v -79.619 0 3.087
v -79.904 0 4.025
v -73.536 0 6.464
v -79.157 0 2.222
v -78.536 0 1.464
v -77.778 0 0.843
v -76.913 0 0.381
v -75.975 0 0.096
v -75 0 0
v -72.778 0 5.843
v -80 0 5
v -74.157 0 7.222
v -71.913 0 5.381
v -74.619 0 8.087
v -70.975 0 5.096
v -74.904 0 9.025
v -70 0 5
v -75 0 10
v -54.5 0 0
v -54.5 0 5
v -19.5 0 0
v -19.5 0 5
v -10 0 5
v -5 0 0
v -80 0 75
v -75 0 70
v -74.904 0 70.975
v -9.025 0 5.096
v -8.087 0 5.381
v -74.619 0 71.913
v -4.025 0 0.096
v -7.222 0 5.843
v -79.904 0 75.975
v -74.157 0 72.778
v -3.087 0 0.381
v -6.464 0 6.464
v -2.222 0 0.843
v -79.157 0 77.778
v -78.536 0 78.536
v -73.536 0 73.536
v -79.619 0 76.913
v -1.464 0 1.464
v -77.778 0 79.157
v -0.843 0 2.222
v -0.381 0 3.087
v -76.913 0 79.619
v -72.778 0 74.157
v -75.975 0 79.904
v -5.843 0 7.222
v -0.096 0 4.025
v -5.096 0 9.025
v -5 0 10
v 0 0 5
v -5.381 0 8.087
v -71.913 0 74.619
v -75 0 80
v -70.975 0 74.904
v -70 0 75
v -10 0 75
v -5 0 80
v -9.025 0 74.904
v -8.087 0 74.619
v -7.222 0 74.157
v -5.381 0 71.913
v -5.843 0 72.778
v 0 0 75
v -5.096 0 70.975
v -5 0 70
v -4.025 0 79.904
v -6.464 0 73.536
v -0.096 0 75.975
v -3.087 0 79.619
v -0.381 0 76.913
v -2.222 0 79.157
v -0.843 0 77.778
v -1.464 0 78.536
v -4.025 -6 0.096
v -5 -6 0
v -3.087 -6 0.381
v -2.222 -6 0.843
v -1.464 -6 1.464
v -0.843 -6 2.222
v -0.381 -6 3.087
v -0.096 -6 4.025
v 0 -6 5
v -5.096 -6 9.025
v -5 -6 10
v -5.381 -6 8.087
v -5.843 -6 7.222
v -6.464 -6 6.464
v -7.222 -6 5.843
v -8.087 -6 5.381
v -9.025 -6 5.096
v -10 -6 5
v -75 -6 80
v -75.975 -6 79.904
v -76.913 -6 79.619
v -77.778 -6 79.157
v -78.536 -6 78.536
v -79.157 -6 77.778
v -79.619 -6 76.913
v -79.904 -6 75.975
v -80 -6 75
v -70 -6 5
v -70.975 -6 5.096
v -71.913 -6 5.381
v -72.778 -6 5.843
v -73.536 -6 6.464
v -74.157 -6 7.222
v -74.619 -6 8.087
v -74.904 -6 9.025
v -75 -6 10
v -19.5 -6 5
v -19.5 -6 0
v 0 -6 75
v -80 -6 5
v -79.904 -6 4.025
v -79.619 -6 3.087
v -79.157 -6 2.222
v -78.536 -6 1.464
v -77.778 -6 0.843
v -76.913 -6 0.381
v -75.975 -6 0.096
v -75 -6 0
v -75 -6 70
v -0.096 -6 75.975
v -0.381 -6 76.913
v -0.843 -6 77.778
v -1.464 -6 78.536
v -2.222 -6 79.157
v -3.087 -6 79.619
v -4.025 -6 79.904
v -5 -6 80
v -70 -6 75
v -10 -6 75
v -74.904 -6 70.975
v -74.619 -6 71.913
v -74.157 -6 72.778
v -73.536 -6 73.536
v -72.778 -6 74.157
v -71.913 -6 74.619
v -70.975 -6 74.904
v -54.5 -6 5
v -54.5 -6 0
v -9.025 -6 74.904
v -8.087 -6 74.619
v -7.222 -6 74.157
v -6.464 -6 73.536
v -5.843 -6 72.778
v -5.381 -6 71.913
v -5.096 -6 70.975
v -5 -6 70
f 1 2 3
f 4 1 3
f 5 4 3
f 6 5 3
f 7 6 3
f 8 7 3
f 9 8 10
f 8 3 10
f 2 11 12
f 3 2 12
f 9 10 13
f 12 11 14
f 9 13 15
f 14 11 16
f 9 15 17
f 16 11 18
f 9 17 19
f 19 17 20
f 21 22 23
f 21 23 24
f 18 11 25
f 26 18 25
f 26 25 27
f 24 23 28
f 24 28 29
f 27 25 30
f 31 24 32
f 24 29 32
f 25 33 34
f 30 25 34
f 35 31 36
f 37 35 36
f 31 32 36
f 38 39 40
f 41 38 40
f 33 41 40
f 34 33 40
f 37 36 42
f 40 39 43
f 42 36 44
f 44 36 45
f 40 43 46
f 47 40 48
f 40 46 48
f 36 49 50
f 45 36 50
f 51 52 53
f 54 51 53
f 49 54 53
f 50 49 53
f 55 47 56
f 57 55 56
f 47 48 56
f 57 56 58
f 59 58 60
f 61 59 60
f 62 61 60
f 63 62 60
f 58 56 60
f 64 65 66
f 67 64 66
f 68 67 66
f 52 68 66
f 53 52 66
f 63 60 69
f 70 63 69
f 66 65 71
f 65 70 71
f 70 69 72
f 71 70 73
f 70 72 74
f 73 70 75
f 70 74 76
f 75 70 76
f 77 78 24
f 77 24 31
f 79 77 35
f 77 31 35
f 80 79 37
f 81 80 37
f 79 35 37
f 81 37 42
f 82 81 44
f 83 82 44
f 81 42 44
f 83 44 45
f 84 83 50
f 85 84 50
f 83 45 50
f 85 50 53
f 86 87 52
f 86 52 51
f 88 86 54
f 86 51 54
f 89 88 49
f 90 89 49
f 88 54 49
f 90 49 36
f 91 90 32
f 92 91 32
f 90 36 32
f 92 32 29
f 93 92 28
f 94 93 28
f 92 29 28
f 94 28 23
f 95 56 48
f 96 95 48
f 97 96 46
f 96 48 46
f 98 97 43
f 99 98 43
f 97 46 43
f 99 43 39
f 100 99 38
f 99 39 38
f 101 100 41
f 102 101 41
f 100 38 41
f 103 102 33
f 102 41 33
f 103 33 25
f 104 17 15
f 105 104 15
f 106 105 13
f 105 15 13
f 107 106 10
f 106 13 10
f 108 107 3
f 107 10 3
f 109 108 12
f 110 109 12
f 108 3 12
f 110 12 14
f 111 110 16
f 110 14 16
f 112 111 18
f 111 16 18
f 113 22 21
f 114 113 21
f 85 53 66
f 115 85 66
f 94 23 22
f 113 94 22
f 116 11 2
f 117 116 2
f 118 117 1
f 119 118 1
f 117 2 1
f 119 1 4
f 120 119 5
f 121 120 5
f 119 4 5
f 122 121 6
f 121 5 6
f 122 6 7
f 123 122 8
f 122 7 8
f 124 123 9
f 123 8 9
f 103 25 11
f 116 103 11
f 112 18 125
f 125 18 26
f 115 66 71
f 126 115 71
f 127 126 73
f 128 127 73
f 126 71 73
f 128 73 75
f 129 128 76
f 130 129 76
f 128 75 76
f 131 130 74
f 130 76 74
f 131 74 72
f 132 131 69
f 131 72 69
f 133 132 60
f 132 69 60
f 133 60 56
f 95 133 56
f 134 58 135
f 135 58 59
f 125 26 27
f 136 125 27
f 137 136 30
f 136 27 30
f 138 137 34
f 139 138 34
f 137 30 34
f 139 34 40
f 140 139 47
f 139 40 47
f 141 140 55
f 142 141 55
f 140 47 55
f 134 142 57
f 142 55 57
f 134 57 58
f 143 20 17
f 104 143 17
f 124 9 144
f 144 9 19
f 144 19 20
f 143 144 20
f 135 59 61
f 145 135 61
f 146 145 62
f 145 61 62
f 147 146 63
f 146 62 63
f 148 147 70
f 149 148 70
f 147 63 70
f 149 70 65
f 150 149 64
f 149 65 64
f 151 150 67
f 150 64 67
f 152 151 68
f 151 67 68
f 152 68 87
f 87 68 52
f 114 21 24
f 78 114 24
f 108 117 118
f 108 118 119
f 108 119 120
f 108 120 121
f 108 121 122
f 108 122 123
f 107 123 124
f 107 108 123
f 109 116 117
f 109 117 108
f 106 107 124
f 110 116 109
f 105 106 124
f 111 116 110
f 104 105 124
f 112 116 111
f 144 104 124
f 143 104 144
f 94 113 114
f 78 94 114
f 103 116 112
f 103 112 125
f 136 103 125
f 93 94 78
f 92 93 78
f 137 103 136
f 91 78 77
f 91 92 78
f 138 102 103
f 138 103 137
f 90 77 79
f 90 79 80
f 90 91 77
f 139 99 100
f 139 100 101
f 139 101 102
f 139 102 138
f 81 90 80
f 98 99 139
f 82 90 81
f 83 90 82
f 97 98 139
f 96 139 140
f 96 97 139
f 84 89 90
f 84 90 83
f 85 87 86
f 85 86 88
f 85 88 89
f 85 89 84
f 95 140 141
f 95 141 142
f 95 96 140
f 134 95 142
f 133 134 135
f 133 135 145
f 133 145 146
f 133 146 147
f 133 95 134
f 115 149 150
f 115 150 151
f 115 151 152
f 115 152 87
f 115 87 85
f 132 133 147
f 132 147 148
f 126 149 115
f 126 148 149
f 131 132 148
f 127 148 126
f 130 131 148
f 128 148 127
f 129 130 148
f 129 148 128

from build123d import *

# Parameters (mm, degrees)
F1_DEPTH = 6


with BuildPart() as f1:
    # F0 (on Front) → F1 (new body)
    with BuildSketch(Plane.XZ):
        with BuildLine():
            Line((-19.5, 0), (-5, 0))
            ThreePointArc((-5, 0), (-1.464466, 1.464466), (0, 5))
            Line((0, 5), (0, 75))
            ThreePointArc((0, 75), (-1.464466, 78.535534), (-5, 80))
            Line((-5, 80), (-75, 80))
            ThreePointArc((-75, 80), (-78.535534, 78.535534), (-80, 75))
            Line((-80, 75), (-80, 5))
            ThreePointArc((-80, 5), (-78.535534, 1.464466), (-75, 0))
            Line((-75, 0), (-54.5, 0))
            Line((-54.5, 0), (-54.5, 5))
            Line((-54.5, 5), (-70, 5))
            ThreePointArc((-70, 5), (-73.535534, 6.464466), (-75, 10))
            Line((-75, 10), (-75, 70))
            ThreePointArc((-75, 70), (-73.535534, 73.535534), (-70, 75))
            Line((-70, 75), (-10, 75))
            ThreePointArc((-10, 75), (-6.464466, 73.535534), (-5, 70))
            Line((-5, 70), (-5, 10))
            ThreePointArc((-5, 10), (-6.464466, 6.464466), (-10, 5))
            Line((-10, 5), (-19.5, 5))
            Line((-19.5, 5), (-19.5, 0))
        make_face()
    extrude(amount=F1_DEPTH)


solid = f1.part
